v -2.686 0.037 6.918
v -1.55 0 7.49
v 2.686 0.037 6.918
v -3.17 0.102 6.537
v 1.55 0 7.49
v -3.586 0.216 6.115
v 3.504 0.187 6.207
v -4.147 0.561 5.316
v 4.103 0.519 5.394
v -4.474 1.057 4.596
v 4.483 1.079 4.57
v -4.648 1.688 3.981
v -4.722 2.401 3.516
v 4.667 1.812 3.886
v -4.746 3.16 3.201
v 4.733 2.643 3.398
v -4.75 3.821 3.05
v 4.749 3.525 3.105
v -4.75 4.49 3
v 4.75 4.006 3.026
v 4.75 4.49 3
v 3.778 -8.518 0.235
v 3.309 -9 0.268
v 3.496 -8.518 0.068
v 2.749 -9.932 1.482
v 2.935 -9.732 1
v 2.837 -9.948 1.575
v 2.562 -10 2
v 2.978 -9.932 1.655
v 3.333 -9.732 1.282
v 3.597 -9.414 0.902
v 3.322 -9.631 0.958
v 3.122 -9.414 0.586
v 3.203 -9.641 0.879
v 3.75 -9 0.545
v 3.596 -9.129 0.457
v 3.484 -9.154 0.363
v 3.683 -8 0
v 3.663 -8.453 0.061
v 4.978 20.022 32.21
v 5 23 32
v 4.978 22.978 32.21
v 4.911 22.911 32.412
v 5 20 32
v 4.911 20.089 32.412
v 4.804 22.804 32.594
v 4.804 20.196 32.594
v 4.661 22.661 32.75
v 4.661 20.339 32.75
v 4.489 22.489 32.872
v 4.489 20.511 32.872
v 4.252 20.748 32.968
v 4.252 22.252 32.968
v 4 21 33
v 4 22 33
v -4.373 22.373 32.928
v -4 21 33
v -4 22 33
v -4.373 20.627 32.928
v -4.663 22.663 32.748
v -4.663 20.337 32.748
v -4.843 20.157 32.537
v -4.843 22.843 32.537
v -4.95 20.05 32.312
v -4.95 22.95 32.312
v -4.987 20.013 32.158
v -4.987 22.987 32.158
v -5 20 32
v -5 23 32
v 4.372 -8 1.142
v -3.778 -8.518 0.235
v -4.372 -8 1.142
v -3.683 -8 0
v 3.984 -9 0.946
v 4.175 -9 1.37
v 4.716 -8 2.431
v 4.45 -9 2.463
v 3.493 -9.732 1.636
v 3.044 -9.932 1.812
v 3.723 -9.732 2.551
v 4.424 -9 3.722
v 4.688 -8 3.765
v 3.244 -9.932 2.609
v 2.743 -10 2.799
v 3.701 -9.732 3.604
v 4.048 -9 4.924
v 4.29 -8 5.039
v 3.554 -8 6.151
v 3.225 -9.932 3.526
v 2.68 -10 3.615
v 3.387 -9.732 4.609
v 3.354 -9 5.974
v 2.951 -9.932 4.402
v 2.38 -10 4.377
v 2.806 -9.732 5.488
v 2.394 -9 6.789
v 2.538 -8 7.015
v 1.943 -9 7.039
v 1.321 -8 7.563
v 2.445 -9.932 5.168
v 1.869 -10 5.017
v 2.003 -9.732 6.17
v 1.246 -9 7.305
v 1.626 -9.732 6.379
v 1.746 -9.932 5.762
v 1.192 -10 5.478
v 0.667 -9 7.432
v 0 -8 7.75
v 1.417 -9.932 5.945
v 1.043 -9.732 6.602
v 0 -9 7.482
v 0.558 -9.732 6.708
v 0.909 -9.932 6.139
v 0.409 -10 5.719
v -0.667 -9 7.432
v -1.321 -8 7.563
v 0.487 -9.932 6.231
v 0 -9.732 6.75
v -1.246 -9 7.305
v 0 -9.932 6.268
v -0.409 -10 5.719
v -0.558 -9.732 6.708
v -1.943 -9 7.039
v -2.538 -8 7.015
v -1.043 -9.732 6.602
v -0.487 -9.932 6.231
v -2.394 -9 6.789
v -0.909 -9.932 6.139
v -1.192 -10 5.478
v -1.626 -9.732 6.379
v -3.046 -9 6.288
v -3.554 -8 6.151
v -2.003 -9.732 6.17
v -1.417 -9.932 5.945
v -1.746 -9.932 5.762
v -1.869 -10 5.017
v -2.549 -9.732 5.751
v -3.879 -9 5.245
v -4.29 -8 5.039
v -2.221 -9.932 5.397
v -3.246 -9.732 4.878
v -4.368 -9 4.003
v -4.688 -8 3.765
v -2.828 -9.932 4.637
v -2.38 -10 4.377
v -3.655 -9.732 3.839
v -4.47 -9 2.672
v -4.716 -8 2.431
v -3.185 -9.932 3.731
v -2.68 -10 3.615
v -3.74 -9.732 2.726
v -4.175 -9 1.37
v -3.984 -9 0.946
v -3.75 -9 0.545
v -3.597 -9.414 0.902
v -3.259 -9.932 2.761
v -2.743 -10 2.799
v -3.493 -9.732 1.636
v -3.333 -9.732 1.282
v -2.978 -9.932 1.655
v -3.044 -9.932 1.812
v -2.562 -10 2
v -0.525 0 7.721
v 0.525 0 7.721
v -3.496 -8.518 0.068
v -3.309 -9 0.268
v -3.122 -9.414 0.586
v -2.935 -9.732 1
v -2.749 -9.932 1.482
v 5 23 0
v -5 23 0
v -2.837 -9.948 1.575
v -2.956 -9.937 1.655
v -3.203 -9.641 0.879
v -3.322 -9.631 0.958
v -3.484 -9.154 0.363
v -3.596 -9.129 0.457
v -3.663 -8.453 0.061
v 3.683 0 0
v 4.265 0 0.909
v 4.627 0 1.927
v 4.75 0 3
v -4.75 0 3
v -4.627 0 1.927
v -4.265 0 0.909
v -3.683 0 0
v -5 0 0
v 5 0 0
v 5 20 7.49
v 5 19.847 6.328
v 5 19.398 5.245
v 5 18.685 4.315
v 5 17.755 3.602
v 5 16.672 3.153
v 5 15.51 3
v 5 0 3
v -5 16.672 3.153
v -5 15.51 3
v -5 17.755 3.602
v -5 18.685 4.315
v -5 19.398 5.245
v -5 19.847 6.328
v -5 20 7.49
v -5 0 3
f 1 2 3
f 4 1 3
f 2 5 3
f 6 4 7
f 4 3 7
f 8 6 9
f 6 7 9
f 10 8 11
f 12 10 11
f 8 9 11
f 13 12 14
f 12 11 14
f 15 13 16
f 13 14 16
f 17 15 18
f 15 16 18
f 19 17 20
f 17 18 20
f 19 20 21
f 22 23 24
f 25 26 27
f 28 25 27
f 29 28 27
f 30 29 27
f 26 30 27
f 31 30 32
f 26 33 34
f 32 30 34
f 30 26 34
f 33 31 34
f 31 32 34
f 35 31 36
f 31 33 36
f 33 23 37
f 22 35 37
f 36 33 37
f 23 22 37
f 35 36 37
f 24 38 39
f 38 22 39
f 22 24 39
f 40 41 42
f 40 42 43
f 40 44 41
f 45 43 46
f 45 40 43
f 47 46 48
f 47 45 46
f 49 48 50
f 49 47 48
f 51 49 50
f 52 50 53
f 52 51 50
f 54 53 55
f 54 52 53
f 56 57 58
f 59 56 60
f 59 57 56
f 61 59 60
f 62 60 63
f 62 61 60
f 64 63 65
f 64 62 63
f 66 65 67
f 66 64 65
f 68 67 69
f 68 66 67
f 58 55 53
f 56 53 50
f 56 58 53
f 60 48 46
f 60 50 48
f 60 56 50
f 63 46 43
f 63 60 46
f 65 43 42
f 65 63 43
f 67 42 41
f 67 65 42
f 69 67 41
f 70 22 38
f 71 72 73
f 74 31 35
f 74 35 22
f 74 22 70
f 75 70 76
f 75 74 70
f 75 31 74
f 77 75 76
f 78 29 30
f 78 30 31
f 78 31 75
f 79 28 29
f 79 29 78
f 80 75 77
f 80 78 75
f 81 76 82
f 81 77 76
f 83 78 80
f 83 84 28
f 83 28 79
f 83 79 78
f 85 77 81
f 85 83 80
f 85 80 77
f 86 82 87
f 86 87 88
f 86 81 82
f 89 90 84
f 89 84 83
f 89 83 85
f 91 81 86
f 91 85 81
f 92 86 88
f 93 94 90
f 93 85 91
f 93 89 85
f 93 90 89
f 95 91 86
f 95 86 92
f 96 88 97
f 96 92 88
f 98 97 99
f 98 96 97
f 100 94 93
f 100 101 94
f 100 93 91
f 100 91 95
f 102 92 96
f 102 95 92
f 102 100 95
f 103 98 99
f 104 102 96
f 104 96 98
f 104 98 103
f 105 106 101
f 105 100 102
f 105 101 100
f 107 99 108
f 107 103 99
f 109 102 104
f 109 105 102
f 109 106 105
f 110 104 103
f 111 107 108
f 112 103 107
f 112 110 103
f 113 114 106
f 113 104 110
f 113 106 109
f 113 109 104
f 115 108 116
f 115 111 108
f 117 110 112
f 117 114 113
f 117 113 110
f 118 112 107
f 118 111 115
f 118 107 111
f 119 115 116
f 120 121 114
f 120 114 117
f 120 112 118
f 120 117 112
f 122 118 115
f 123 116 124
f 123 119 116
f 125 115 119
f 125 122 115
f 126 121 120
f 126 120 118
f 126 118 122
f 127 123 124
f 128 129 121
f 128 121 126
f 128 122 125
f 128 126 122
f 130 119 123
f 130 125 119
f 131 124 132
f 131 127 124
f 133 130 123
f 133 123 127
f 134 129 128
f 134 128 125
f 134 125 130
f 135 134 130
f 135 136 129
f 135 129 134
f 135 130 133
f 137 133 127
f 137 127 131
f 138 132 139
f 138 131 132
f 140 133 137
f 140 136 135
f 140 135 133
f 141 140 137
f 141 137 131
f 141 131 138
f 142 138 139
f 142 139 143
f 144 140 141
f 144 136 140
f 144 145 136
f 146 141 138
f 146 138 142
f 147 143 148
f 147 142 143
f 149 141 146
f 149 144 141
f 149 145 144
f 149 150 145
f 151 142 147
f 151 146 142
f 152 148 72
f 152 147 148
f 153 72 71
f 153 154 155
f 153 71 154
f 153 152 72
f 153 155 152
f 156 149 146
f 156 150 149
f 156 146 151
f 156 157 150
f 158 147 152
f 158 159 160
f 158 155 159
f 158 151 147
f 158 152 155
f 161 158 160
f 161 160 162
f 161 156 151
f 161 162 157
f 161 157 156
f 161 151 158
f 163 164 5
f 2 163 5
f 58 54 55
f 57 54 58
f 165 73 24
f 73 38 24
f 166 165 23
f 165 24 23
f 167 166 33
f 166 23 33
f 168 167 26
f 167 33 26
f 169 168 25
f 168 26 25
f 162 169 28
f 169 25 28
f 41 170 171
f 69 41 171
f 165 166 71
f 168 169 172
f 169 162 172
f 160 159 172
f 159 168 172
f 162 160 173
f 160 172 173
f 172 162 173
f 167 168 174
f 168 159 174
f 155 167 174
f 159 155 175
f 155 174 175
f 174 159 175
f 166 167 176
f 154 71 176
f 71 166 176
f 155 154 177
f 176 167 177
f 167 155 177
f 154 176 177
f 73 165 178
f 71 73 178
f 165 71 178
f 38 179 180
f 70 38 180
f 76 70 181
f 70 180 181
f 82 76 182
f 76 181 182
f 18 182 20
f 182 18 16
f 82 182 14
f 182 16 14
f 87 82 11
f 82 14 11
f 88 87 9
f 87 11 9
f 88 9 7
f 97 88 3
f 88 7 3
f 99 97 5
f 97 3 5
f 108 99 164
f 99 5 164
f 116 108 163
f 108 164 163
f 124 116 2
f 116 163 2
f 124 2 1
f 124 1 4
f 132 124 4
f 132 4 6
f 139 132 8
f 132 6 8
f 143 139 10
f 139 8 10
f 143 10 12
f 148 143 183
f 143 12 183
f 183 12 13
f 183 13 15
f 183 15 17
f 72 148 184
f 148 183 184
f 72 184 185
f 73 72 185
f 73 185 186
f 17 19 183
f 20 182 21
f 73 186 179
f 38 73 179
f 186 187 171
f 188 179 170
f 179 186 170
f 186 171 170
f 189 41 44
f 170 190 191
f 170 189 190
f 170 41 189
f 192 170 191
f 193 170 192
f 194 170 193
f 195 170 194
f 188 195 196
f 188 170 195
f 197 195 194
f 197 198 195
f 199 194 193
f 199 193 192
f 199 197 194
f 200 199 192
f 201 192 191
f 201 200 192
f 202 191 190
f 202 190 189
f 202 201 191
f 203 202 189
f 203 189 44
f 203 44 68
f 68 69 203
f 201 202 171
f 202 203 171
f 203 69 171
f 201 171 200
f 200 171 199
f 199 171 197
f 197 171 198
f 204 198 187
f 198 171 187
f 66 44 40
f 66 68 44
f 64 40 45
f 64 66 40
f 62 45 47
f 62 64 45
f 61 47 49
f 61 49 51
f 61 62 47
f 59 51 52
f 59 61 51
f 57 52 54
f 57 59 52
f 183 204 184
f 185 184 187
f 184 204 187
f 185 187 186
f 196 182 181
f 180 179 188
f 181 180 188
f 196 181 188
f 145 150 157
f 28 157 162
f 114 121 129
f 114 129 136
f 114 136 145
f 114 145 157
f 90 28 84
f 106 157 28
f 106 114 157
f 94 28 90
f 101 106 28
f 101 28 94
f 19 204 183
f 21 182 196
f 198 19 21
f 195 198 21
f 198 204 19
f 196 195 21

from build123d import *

# Parameters (mm, degrees)
PAD_DEPTH    = 10
SKETCH001_W  = 10
SKETCH001_H  = 23
PAD001_DEPTH = 3
SKETCH002_W  = 10
SKETCH002_H  = 3
PAD002_DEPTH = 30
FILLET_R     = 4.49
FILLET001_R  = 1
FILLET002_R  = 2


with BuildPart() as part:
    # Sketch → Pad (new body)
    with BuildSketch(Plane.XZ):
        with BuildLine():
            ThreePointArc((3.68273, 0), (0, 7.75), (-3.68273, 0))
            Line((-3.68273, 0), (3.68273, 0))
        make_face()
    extrude(amount=PAD_DEPTH)

    # Sketch001 → Pad001 (join)
    with BuildSketch(Plane.XY):
        with Locations((0, 11.5)):
            Rectangle(SKETCH001_W, SKETCH001_H)
    extrude(amount=PAD001_DEPTH)

    # Sketch002 (on Face7 of Pad001) → Pad002 (join)
    with BuildSketch(Plane(origin=(0, 0, 3), x_dir=(-1, 0, 0), z_dir=(0, 0, 1))):
        with Locations((0, -21.5)):
            Rectangle(SKETCH002_W, SKETCH002_H)
    extrude(amount=PAD002_DEPTH)

    # Fillet
    fillet_edges = [part.edges().sort_by_distance(p)[0] for p in [
        (0, 20, 3),
        (0, 0, 3),
    ]]
    fillet(fillet_edges, radius=FILLET_R)

    # Fillet001
    fillet001_edges = [part.edges().sort_by_distance(p)[0] for p in [
        (5, 21.5, 33),
        (0, 23, 33),
        (-5, 21.5, 33),
        (0, 20, 33),
    ]]
    fillet(fillet001_edges, radius=FILLET001_R)

    # Fillet002
    fillet002_edges = [part.edges().sort_by_distance(p)[0] for p in [
        (0, -10, 0),
        (0, -10, 7.75),
    ]]
    fillet(fillet002_edges, radius=FILLET002_R)


solid = part.part
